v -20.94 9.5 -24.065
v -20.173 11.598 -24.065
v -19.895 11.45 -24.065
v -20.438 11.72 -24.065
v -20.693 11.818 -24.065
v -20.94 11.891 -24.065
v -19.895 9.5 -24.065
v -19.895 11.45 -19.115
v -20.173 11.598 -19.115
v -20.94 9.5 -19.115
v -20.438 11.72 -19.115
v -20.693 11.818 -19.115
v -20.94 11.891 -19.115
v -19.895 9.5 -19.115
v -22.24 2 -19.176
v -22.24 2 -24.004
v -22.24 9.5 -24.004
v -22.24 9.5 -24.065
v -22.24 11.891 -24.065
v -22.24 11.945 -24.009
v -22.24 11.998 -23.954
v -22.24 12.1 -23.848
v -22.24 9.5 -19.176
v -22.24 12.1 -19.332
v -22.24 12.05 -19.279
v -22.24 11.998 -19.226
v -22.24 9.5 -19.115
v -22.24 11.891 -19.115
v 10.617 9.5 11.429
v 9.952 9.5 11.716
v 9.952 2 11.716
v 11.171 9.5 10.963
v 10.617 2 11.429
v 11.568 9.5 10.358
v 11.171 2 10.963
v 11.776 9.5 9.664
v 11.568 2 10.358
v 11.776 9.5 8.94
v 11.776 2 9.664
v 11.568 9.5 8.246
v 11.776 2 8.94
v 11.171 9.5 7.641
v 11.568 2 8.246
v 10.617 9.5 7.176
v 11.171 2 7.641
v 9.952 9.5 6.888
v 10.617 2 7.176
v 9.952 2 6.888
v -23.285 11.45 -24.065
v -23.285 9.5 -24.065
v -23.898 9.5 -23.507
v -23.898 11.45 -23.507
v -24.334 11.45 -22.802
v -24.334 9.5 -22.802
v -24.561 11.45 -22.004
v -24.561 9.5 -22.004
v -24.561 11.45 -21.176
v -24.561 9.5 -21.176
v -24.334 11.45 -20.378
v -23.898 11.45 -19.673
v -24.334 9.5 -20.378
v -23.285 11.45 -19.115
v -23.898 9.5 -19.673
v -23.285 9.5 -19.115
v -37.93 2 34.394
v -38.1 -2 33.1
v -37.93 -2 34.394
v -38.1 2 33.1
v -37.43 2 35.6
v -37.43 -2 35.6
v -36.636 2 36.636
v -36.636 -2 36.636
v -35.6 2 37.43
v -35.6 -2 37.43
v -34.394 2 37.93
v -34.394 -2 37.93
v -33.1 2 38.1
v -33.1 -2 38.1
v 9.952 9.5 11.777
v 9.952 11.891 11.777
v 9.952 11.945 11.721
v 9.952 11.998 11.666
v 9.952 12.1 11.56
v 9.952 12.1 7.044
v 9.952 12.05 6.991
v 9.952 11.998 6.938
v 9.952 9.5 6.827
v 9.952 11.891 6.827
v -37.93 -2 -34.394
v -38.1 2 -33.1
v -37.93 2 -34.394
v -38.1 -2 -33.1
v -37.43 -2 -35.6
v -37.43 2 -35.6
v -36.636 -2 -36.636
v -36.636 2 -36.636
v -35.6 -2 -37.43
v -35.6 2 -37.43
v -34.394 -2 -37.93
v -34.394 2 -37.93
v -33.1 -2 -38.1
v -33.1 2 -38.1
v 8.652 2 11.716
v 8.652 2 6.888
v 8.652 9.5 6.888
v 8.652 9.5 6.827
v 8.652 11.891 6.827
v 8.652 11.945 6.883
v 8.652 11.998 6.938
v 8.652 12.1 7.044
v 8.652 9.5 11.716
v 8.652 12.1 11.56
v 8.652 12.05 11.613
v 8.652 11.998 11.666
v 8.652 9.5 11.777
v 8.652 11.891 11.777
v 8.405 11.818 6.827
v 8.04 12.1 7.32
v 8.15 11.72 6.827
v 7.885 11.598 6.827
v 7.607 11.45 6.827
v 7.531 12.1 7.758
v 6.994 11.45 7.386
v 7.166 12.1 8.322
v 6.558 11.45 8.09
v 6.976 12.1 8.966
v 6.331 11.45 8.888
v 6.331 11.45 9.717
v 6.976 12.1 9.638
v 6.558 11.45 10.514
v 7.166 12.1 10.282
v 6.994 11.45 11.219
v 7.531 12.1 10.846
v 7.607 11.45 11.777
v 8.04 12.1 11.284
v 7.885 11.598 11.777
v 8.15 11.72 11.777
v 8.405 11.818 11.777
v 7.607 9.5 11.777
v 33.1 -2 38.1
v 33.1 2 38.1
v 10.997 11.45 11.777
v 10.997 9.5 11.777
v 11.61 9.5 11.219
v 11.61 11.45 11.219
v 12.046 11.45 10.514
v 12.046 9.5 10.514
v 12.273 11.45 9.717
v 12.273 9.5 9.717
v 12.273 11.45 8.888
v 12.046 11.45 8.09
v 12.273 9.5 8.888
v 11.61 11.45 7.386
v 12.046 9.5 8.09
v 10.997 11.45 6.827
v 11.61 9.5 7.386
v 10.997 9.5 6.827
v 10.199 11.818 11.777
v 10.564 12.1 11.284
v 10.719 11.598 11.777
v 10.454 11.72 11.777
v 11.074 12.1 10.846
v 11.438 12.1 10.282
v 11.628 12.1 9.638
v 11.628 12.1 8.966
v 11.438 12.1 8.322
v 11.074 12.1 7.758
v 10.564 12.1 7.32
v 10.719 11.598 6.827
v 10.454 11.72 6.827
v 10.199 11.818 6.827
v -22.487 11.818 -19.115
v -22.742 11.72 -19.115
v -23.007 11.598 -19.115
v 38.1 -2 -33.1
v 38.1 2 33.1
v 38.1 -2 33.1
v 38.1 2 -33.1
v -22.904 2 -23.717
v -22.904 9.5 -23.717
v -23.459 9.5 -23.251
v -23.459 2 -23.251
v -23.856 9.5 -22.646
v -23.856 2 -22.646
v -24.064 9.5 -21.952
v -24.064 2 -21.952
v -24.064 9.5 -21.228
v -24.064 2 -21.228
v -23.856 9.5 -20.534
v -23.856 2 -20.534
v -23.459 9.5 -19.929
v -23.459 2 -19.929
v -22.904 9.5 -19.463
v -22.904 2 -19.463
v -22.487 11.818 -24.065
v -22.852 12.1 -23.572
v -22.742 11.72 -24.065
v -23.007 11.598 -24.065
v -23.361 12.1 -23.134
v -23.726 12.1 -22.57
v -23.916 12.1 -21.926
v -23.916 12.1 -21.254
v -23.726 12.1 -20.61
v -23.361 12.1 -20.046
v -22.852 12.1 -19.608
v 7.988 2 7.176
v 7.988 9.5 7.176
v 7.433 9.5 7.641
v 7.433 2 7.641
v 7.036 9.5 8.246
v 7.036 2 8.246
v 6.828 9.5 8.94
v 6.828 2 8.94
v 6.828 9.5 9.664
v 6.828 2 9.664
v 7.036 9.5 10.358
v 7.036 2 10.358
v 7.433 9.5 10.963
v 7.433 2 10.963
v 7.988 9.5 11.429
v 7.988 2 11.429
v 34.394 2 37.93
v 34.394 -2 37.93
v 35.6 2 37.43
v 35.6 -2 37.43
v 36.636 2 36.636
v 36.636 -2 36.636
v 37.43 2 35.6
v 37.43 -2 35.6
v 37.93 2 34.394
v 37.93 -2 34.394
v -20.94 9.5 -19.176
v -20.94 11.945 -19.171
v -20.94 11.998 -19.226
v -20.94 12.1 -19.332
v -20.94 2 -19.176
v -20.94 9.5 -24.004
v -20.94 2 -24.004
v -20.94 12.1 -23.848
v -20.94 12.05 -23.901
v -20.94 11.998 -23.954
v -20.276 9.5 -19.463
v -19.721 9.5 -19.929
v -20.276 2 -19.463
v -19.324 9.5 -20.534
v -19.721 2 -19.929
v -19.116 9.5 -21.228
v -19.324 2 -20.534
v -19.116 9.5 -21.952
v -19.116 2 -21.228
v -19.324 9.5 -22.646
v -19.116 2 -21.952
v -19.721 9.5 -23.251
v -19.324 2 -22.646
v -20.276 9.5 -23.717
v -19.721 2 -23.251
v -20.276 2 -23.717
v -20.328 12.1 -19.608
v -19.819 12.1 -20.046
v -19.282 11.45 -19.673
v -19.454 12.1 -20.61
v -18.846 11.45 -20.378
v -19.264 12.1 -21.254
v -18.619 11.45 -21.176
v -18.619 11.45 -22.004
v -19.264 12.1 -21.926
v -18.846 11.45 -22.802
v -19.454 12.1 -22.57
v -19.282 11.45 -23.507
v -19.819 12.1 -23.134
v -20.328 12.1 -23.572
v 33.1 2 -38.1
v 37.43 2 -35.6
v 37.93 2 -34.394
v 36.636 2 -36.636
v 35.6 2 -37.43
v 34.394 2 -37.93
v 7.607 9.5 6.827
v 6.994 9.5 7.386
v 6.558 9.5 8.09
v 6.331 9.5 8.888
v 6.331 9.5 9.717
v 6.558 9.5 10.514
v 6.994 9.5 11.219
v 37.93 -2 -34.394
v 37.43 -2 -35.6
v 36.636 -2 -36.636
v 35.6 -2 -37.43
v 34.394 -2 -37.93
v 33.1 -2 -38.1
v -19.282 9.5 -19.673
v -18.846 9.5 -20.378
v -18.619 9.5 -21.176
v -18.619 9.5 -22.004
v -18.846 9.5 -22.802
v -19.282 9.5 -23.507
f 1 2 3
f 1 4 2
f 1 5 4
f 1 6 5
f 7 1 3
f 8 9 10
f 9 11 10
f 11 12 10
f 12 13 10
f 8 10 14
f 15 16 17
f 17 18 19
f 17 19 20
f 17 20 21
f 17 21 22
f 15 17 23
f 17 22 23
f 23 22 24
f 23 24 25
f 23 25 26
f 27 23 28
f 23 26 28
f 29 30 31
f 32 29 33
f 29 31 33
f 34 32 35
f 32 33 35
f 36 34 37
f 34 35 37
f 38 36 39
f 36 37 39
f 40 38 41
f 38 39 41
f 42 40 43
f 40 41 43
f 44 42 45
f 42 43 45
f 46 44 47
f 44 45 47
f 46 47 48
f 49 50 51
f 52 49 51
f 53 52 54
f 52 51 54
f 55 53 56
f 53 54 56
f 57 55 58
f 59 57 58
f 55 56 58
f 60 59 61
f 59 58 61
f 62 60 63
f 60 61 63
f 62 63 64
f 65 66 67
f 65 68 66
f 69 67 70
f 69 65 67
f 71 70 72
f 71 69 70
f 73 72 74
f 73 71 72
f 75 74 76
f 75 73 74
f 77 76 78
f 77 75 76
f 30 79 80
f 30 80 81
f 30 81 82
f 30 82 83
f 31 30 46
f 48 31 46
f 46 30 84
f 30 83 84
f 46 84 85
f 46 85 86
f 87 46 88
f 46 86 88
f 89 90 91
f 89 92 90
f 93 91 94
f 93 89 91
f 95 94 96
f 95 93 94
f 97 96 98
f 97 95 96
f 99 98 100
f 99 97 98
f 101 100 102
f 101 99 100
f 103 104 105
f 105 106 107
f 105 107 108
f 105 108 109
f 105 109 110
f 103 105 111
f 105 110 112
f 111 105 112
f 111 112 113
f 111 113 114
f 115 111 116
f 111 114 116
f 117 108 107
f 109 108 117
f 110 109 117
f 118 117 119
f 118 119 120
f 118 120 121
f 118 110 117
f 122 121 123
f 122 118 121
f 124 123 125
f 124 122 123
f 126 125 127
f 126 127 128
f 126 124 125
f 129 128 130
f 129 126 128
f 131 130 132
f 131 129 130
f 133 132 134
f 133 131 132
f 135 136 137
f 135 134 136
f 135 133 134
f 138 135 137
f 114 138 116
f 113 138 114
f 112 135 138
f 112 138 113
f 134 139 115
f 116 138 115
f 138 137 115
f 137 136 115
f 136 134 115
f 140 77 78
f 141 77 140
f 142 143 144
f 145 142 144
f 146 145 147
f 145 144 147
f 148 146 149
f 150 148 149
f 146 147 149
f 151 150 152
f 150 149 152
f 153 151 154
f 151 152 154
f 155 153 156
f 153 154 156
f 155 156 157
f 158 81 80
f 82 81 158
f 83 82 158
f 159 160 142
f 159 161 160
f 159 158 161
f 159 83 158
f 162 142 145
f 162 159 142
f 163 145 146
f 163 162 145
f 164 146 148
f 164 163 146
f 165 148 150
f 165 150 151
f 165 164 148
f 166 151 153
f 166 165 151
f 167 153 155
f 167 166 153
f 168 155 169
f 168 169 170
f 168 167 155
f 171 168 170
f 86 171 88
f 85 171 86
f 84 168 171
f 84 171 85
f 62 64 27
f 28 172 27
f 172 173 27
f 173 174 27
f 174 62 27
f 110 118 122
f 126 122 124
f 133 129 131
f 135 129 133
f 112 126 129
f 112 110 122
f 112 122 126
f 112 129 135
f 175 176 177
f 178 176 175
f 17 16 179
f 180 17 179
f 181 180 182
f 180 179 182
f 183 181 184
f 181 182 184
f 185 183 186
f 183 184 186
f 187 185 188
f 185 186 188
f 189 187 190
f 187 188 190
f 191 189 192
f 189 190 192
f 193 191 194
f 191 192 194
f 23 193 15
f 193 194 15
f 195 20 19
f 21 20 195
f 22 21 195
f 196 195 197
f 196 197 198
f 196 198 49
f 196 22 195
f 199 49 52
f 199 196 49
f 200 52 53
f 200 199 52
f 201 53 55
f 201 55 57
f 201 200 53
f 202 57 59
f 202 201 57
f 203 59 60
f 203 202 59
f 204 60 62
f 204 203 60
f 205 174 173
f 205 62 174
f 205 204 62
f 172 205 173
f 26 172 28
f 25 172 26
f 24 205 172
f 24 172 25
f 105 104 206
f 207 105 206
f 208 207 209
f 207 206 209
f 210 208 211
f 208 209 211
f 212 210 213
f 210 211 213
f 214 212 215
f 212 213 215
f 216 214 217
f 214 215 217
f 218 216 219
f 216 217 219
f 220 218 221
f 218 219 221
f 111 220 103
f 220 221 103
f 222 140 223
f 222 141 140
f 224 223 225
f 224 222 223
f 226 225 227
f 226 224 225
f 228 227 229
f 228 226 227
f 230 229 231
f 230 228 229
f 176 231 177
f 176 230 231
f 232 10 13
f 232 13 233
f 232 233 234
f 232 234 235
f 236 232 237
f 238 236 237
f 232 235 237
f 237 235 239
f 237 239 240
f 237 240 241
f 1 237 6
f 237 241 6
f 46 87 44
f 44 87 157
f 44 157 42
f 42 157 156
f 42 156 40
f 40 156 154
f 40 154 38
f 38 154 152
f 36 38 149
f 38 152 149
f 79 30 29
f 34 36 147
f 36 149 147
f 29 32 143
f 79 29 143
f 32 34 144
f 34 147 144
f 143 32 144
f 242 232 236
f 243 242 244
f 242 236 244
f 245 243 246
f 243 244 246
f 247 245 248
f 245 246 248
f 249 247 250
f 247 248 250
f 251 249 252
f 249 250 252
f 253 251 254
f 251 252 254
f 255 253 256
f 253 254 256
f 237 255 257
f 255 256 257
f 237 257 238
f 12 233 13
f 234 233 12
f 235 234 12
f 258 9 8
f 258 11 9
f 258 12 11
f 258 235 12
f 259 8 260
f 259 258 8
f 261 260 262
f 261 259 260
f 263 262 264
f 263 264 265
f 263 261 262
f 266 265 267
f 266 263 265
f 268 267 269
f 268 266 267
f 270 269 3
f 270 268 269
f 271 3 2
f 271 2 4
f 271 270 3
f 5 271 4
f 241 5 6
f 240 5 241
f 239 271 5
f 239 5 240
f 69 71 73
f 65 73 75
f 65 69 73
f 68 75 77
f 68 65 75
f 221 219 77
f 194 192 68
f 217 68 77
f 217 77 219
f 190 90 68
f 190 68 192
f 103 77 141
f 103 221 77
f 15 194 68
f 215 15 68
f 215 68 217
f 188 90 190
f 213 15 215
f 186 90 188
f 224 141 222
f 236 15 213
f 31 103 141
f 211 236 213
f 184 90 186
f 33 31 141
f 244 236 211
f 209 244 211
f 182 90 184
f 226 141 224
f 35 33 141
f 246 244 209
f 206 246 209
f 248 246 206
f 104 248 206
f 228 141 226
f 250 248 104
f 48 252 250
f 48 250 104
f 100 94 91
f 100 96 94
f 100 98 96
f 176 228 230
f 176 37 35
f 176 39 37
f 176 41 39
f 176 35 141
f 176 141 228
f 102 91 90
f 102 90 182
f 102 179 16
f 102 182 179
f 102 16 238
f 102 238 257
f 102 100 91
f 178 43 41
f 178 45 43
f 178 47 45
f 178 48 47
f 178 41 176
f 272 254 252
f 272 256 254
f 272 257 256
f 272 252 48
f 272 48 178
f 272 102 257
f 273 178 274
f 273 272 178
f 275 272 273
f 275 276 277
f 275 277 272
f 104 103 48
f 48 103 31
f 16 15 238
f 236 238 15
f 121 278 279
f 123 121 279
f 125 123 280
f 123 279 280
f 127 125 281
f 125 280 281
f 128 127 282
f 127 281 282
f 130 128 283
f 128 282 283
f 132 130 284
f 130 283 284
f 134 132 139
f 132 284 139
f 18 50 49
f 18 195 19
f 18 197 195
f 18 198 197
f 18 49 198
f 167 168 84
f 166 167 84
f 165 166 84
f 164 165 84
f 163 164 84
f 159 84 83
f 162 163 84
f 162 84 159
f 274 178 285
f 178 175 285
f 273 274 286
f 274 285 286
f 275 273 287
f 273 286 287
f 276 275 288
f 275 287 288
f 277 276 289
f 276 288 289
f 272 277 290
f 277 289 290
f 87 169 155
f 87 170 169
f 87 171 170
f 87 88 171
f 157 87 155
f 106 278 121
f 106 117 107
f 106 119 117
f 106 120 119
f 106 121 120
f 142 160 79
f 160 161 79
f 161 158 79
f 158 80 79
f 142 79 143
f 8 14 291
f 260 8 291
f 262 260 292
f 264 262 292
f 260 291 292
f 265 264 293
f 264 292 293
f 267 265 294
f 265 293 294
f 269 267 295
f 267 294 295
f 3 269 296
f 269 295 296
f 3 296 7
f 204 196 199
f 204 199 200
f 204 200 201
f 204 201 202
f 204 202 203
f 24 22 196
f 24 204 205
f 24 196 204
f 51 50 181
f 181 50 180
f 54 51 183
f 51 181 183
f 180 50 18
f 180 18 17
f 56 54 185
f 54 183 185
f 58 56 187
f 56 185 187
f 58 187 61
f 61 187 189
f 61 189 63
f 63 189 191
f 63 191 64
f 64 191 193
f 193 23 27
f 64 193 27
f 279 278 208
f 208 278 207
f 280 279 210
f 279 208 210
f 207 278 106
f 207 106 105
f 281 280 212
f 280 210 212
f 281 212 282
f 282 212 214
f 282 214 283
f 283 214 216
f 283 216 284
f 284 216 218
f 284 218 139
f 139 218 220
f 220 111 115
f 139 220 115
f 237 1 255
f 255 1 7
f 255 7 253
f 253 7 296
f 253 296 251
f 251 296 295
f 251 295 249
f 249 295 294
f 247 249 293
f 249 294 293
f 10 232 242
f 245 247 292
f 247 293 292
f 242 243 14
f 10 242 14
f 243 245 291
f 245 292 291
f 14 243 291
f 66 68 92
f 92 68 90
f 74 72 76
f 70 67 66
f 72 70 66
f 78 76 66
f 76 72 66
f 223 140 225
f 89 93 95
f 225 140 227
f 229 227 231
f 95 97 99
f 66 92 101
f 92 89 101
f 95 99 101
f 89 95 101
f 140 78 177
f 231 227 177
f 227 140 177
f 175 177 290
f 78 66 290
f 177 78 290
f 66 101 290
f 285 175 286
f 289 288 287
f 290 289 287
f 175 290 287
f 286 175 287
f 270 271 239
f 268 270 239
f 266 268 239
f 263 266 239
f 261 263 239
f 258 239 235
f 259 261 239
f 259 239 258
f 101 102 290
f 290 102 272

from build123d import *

# Parameters (mm, degrees)
BASE_PROFILE_W              = 76.2
BASE_PROFILE_H              = 76.2
BASE_DEPTH                  = 2
CONNECTOR_PROFILE_R         = 2.5
CONNECTOR_BODY_DEPTH        = 7.5
HEAD_PROFILE_R              = 3
CONNECTOR_HEAD_DEPTH        = 2.6
CONNECTOR_HEAD_CHAMFER_SIZE = 0.65
CONNECTOR_GAP_REACH         = 57.696
TRIM_START                  = -2.6
TRIM_HEAD_DEPTH             = 2.39107
ROUND_EDGE_R                = 5


with BuildPart() as part:
    # Base Profile → Base (new, symmetric)
    with BuildSketch(Plane(origin=(0, 0, 0), x_dir=(1, 0, 0), z_dir=(0, 1, 0))):
        Rectangle(BASE_PROFILE_W, BASE_PROFILE_H)
    extrude(amount=BASE_DEPTH, both=True)

    # Connector Profile → Connector Body (add)
    with BuildSketch(Plane(origin=(0, 2, 0), x_dir=(1, 0, 0), z_dir=(0, 1, 0))):
        with Locations(Location((-21.59, 21.59, 0), (0, 0, 90))):
            Circle(CONNECTOR_PROFILE_R)
        with Locations(Location((9.302081056, -9.302081056, 0), (0, 0, 90))):
            Circle(CONNECTOR_PROFILE_R)
    extrude(amount=CONNECTOR_BODY_DEPTH)

    # Head Profile → Connector Head (add)
    with BuildSketch(Plane(origin=(0, 9.5, 0), x_dir=(1, 0, 0), z_dir=(0, 1, 0))):
        with Locations(Location((-21.59, 21.59, 0), (0, 0, 270))):
            Circle(HEAD_PROFILE_R)
        with Locations(Location((9.302081056, -9.302081056, 0), (0, 0, 270))):
            Circle(HEAD_PROFILE_R)
    extrude(amount=CONNECTOR_HEAD_DEPTH)

    # Connector Head Chamfer
    connector_head_chamfer_edges = [part.edges().sort_by_distance(p)[0] for p in [
        (-21.59, 12.1, -24.59),
        (9.302081056, 12.1, 6.302081056),
    ]]
    chamfer(connector_head_chamfer_edges, length=CONNECTOR_HEAD_CHAMFER_SIZE)

    # Connector Gap: up to this face of the body (flat: up to its plane)
    connector_gap_end = Plane(part.part.faces().sort_by_distance((0.041835549, 2, 0.041835549))[0])
    # Gap Profile → Connector Gap (cut, up to the picked face)
    with BuildSketch(Plane(origin=(0, 12.1, 0), x_dir=(1, 0, 0), z_dir=(0, 1, 0)), mode=Mode.PRIVATE) as connector_gap_sk1:
        with BuildLine():
            Line((-22.24, 24.518736929), (-22.24, 18.661263071))
            ThreePointArc((-22.24, 18.661263071), (-21.59, 18.59), (-20.94, 18.661263071))
            Line((-20.94, 18.661263071), (-20.94, 24.518736929))
            ThreePointArc((-20.94, 24.518736929), (-21.59, 24.59), (-22.24, 24.518736929))
        make_face()
    connector_gap_tool1 = split(extrude(connector_gap_sk1.sketch, amount=-CONNECTOR_GAP_REACH, mode=Mode.PRIVATE), bisect_by=connector_gap_end, keep=Keep.BOTH, mode=Mode.PRIVATE)
    # Gap Profile → Connector Gap (cut, up to the picked face)
    with BuildSketch(Plane(origin=(0, 12.1, 0), x_dir=(1, 0, 0), z_dir=(0, 1, 0)), mode=Mode.PRIVATE) as connector_gap_sk2:
        with BuildLine():
            Line((8.652081056, -6.373344127), (8.652081056, -12.230817986))
            ThreePointArc((8.652081056, -12.230817986), (9.302081056, -12.302081056), (9.952081056, -12.230817986))
            Line((9.952081056, -12.230817986), (9.952081056, -6.373344127))
            ThreePointArc((9.952081056, -6.373344127), (9.302081056, -6.302081056), (8.652081056, -6.373344127))
        make_face()
    connector_gap_tool2 = split(extrude(connector_gap_sk2.sketch, amount=-CONNECTOR_GAP_REACH, mode=Mode.PRIVATE), bisect_by=connector_gap_end, keep=Keep.BOTH, mode=Mode.PRIVATE)
    add(connector_gap_tool1.solids().sort_by(Axis((-21.59, 12.1, -21.59), (0, -1, 0)))[0], mode=Mode.SUBTRACT)
    add(connector_gap_tool2.solids().sort_by(Axis((9.302081, 12.1, 9.302081), (0, -1, 0)))[0], mode=Mode.SUBTRACT)

    # Trim Profile → Trim Head (cut)
    with BuildSketch(Plane(origin=(0, 12.1, 0), x_dir=(1, 0, 0), z_dir=(0, 1, 0)).offset(TRIM_START)):
        with BuildLine():
            Line((7.606682873, -6.827081056), (10.99747924, -6.827081056))
            ThreePointArc((10.99747924, -6.827081056), (9.302081056, -6.302081056), (7.606682873, -6.827081056))
        make_face()
        with BuildLine():
            Line((7.606682873, -11.777081056), (10.99747924, -11.777081056))
            ThreePointArc((10.99747924, -11.777081056), (9.302081056, -12.302081056), (7.606682873, -11.777081056))
        make_face()
        with BuildLine():
            Line((-23.285398183, 24.065), (-19.894601817, 24.065))
            ThreePointArc((-19.894601817, 24.065), (-21.59, 24.59), (-23.285398183, 24.065))
        make_face()
        with BuildLine():
            Line((-23.285398183, 19.115), (-19.894601817, 19.115))
            ThreePointArc((-19.894601817, 19.115), (-21.59, 18.59), (-23.285398183, 19.115))
        make_face()
    extrude(amount=TRIM_HEAD_DEPTH, mode=Mode.SUBTRACT)

    # Round Edge
    round_edge_edges = [part.edges().sort_by_distance(p)[0] for p in [
        (38.1, 0, 38.1),
        (-38.1, 0, 38.1),
        (-38.1, 0, -38.1),
        (38.1, 0, -38.1),
    ]]
    fillet(round_edge_edges, radius=ROUND_EDGE_R)


solid = part.part
